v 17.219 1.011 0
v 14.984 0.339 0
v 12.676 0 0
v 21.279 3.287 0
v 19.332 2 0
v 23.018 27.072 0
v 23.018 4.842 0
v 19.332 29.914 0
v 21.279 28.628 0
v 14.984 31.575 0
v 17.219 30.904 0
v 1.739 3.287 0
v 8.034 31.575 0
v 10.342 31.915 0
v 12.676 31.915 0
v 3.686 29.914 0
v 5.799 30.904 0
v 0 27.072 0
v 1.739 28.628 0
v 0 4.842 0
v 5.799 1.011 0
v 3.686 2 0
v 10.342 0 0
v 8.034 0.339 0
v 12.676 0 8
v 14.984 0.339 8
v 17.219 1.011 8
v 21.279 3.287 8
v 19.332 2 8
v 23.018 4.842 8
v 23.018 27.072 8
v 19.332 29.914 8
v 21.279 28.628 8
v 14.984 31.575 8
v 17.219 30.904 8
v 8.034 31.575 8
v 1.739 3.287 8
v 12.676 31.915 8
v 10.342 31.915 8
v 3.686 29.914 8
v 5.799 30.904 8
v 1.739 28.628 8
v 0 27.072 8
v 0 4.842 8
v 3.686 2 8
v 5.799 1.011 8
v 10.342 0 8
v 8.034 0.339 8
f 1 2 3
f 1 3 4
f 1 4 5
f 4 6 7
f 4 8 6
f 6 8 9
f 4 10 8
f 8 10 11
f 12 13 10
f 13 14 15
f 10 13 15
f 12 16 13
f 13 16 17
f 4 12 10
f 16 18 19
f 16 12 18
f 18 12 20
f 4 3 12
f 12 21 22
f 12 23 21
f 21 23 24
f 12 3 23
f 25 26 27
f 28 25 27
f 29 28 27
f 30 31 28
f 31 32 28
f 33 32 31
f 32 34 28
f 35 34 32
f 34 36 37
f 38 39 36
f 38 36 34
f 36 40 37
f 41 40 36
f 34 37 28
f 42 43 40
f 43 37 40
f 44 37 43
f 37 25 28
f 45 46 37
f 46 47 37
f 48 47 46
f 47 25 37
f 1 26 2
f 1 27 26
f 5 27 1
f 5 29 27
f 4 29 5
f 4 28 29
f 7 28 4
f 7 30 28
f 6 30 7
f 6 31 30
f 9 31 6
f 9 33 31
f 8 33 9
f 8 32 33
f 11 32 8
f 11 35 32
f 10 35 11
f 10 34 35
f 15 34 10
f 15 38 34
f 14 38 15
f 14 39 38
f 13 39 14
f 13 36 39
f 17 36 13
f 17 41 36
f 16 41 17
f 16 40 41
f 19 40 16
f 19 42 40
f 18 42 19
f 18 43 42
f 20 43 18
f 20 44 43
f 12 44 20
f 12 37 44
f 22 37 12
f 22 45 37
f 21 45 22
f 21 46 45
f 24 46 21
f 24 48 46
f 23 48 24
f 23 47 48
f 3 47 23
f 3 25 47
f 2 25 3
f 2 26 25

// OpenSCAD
$fn = 32;

// ----------------------------------------------------------------------
// Flat adaptor: double_d, 8 mm thick
// ----------------------------------------------------------------------

// --- parameters (mm) ---
profile_height = 8;       // extrusion height
profile_points = 24;      // points of the closed outline

profile = [[23.018, 27.072], [21.279, 28.628], [19.332, 29.914], [17.219, 30.904], [14.984, 31.575], [12.676, 31.915], [10.342, 31.915], [8.034, 31.575], [5.799, 30.904], [3.686, 29.914], [1.739, 28.628], [0, 27.072], [0, 4.842], [1.739, 3.287], [3.686, 2], [5.799, 1.011], [8.034, 0.339], [10.342, 0], [12.676, 0], [14.984, 0.339], [17.219, 1.011], [19.332, 2], [21.279, 3.287], [23.018, 4.842]];  // single closed polygon, 24 points, counter clockwise

// --- the one profile operation ---
linear_extrude(height = profile_height) polygon(points = profile);
